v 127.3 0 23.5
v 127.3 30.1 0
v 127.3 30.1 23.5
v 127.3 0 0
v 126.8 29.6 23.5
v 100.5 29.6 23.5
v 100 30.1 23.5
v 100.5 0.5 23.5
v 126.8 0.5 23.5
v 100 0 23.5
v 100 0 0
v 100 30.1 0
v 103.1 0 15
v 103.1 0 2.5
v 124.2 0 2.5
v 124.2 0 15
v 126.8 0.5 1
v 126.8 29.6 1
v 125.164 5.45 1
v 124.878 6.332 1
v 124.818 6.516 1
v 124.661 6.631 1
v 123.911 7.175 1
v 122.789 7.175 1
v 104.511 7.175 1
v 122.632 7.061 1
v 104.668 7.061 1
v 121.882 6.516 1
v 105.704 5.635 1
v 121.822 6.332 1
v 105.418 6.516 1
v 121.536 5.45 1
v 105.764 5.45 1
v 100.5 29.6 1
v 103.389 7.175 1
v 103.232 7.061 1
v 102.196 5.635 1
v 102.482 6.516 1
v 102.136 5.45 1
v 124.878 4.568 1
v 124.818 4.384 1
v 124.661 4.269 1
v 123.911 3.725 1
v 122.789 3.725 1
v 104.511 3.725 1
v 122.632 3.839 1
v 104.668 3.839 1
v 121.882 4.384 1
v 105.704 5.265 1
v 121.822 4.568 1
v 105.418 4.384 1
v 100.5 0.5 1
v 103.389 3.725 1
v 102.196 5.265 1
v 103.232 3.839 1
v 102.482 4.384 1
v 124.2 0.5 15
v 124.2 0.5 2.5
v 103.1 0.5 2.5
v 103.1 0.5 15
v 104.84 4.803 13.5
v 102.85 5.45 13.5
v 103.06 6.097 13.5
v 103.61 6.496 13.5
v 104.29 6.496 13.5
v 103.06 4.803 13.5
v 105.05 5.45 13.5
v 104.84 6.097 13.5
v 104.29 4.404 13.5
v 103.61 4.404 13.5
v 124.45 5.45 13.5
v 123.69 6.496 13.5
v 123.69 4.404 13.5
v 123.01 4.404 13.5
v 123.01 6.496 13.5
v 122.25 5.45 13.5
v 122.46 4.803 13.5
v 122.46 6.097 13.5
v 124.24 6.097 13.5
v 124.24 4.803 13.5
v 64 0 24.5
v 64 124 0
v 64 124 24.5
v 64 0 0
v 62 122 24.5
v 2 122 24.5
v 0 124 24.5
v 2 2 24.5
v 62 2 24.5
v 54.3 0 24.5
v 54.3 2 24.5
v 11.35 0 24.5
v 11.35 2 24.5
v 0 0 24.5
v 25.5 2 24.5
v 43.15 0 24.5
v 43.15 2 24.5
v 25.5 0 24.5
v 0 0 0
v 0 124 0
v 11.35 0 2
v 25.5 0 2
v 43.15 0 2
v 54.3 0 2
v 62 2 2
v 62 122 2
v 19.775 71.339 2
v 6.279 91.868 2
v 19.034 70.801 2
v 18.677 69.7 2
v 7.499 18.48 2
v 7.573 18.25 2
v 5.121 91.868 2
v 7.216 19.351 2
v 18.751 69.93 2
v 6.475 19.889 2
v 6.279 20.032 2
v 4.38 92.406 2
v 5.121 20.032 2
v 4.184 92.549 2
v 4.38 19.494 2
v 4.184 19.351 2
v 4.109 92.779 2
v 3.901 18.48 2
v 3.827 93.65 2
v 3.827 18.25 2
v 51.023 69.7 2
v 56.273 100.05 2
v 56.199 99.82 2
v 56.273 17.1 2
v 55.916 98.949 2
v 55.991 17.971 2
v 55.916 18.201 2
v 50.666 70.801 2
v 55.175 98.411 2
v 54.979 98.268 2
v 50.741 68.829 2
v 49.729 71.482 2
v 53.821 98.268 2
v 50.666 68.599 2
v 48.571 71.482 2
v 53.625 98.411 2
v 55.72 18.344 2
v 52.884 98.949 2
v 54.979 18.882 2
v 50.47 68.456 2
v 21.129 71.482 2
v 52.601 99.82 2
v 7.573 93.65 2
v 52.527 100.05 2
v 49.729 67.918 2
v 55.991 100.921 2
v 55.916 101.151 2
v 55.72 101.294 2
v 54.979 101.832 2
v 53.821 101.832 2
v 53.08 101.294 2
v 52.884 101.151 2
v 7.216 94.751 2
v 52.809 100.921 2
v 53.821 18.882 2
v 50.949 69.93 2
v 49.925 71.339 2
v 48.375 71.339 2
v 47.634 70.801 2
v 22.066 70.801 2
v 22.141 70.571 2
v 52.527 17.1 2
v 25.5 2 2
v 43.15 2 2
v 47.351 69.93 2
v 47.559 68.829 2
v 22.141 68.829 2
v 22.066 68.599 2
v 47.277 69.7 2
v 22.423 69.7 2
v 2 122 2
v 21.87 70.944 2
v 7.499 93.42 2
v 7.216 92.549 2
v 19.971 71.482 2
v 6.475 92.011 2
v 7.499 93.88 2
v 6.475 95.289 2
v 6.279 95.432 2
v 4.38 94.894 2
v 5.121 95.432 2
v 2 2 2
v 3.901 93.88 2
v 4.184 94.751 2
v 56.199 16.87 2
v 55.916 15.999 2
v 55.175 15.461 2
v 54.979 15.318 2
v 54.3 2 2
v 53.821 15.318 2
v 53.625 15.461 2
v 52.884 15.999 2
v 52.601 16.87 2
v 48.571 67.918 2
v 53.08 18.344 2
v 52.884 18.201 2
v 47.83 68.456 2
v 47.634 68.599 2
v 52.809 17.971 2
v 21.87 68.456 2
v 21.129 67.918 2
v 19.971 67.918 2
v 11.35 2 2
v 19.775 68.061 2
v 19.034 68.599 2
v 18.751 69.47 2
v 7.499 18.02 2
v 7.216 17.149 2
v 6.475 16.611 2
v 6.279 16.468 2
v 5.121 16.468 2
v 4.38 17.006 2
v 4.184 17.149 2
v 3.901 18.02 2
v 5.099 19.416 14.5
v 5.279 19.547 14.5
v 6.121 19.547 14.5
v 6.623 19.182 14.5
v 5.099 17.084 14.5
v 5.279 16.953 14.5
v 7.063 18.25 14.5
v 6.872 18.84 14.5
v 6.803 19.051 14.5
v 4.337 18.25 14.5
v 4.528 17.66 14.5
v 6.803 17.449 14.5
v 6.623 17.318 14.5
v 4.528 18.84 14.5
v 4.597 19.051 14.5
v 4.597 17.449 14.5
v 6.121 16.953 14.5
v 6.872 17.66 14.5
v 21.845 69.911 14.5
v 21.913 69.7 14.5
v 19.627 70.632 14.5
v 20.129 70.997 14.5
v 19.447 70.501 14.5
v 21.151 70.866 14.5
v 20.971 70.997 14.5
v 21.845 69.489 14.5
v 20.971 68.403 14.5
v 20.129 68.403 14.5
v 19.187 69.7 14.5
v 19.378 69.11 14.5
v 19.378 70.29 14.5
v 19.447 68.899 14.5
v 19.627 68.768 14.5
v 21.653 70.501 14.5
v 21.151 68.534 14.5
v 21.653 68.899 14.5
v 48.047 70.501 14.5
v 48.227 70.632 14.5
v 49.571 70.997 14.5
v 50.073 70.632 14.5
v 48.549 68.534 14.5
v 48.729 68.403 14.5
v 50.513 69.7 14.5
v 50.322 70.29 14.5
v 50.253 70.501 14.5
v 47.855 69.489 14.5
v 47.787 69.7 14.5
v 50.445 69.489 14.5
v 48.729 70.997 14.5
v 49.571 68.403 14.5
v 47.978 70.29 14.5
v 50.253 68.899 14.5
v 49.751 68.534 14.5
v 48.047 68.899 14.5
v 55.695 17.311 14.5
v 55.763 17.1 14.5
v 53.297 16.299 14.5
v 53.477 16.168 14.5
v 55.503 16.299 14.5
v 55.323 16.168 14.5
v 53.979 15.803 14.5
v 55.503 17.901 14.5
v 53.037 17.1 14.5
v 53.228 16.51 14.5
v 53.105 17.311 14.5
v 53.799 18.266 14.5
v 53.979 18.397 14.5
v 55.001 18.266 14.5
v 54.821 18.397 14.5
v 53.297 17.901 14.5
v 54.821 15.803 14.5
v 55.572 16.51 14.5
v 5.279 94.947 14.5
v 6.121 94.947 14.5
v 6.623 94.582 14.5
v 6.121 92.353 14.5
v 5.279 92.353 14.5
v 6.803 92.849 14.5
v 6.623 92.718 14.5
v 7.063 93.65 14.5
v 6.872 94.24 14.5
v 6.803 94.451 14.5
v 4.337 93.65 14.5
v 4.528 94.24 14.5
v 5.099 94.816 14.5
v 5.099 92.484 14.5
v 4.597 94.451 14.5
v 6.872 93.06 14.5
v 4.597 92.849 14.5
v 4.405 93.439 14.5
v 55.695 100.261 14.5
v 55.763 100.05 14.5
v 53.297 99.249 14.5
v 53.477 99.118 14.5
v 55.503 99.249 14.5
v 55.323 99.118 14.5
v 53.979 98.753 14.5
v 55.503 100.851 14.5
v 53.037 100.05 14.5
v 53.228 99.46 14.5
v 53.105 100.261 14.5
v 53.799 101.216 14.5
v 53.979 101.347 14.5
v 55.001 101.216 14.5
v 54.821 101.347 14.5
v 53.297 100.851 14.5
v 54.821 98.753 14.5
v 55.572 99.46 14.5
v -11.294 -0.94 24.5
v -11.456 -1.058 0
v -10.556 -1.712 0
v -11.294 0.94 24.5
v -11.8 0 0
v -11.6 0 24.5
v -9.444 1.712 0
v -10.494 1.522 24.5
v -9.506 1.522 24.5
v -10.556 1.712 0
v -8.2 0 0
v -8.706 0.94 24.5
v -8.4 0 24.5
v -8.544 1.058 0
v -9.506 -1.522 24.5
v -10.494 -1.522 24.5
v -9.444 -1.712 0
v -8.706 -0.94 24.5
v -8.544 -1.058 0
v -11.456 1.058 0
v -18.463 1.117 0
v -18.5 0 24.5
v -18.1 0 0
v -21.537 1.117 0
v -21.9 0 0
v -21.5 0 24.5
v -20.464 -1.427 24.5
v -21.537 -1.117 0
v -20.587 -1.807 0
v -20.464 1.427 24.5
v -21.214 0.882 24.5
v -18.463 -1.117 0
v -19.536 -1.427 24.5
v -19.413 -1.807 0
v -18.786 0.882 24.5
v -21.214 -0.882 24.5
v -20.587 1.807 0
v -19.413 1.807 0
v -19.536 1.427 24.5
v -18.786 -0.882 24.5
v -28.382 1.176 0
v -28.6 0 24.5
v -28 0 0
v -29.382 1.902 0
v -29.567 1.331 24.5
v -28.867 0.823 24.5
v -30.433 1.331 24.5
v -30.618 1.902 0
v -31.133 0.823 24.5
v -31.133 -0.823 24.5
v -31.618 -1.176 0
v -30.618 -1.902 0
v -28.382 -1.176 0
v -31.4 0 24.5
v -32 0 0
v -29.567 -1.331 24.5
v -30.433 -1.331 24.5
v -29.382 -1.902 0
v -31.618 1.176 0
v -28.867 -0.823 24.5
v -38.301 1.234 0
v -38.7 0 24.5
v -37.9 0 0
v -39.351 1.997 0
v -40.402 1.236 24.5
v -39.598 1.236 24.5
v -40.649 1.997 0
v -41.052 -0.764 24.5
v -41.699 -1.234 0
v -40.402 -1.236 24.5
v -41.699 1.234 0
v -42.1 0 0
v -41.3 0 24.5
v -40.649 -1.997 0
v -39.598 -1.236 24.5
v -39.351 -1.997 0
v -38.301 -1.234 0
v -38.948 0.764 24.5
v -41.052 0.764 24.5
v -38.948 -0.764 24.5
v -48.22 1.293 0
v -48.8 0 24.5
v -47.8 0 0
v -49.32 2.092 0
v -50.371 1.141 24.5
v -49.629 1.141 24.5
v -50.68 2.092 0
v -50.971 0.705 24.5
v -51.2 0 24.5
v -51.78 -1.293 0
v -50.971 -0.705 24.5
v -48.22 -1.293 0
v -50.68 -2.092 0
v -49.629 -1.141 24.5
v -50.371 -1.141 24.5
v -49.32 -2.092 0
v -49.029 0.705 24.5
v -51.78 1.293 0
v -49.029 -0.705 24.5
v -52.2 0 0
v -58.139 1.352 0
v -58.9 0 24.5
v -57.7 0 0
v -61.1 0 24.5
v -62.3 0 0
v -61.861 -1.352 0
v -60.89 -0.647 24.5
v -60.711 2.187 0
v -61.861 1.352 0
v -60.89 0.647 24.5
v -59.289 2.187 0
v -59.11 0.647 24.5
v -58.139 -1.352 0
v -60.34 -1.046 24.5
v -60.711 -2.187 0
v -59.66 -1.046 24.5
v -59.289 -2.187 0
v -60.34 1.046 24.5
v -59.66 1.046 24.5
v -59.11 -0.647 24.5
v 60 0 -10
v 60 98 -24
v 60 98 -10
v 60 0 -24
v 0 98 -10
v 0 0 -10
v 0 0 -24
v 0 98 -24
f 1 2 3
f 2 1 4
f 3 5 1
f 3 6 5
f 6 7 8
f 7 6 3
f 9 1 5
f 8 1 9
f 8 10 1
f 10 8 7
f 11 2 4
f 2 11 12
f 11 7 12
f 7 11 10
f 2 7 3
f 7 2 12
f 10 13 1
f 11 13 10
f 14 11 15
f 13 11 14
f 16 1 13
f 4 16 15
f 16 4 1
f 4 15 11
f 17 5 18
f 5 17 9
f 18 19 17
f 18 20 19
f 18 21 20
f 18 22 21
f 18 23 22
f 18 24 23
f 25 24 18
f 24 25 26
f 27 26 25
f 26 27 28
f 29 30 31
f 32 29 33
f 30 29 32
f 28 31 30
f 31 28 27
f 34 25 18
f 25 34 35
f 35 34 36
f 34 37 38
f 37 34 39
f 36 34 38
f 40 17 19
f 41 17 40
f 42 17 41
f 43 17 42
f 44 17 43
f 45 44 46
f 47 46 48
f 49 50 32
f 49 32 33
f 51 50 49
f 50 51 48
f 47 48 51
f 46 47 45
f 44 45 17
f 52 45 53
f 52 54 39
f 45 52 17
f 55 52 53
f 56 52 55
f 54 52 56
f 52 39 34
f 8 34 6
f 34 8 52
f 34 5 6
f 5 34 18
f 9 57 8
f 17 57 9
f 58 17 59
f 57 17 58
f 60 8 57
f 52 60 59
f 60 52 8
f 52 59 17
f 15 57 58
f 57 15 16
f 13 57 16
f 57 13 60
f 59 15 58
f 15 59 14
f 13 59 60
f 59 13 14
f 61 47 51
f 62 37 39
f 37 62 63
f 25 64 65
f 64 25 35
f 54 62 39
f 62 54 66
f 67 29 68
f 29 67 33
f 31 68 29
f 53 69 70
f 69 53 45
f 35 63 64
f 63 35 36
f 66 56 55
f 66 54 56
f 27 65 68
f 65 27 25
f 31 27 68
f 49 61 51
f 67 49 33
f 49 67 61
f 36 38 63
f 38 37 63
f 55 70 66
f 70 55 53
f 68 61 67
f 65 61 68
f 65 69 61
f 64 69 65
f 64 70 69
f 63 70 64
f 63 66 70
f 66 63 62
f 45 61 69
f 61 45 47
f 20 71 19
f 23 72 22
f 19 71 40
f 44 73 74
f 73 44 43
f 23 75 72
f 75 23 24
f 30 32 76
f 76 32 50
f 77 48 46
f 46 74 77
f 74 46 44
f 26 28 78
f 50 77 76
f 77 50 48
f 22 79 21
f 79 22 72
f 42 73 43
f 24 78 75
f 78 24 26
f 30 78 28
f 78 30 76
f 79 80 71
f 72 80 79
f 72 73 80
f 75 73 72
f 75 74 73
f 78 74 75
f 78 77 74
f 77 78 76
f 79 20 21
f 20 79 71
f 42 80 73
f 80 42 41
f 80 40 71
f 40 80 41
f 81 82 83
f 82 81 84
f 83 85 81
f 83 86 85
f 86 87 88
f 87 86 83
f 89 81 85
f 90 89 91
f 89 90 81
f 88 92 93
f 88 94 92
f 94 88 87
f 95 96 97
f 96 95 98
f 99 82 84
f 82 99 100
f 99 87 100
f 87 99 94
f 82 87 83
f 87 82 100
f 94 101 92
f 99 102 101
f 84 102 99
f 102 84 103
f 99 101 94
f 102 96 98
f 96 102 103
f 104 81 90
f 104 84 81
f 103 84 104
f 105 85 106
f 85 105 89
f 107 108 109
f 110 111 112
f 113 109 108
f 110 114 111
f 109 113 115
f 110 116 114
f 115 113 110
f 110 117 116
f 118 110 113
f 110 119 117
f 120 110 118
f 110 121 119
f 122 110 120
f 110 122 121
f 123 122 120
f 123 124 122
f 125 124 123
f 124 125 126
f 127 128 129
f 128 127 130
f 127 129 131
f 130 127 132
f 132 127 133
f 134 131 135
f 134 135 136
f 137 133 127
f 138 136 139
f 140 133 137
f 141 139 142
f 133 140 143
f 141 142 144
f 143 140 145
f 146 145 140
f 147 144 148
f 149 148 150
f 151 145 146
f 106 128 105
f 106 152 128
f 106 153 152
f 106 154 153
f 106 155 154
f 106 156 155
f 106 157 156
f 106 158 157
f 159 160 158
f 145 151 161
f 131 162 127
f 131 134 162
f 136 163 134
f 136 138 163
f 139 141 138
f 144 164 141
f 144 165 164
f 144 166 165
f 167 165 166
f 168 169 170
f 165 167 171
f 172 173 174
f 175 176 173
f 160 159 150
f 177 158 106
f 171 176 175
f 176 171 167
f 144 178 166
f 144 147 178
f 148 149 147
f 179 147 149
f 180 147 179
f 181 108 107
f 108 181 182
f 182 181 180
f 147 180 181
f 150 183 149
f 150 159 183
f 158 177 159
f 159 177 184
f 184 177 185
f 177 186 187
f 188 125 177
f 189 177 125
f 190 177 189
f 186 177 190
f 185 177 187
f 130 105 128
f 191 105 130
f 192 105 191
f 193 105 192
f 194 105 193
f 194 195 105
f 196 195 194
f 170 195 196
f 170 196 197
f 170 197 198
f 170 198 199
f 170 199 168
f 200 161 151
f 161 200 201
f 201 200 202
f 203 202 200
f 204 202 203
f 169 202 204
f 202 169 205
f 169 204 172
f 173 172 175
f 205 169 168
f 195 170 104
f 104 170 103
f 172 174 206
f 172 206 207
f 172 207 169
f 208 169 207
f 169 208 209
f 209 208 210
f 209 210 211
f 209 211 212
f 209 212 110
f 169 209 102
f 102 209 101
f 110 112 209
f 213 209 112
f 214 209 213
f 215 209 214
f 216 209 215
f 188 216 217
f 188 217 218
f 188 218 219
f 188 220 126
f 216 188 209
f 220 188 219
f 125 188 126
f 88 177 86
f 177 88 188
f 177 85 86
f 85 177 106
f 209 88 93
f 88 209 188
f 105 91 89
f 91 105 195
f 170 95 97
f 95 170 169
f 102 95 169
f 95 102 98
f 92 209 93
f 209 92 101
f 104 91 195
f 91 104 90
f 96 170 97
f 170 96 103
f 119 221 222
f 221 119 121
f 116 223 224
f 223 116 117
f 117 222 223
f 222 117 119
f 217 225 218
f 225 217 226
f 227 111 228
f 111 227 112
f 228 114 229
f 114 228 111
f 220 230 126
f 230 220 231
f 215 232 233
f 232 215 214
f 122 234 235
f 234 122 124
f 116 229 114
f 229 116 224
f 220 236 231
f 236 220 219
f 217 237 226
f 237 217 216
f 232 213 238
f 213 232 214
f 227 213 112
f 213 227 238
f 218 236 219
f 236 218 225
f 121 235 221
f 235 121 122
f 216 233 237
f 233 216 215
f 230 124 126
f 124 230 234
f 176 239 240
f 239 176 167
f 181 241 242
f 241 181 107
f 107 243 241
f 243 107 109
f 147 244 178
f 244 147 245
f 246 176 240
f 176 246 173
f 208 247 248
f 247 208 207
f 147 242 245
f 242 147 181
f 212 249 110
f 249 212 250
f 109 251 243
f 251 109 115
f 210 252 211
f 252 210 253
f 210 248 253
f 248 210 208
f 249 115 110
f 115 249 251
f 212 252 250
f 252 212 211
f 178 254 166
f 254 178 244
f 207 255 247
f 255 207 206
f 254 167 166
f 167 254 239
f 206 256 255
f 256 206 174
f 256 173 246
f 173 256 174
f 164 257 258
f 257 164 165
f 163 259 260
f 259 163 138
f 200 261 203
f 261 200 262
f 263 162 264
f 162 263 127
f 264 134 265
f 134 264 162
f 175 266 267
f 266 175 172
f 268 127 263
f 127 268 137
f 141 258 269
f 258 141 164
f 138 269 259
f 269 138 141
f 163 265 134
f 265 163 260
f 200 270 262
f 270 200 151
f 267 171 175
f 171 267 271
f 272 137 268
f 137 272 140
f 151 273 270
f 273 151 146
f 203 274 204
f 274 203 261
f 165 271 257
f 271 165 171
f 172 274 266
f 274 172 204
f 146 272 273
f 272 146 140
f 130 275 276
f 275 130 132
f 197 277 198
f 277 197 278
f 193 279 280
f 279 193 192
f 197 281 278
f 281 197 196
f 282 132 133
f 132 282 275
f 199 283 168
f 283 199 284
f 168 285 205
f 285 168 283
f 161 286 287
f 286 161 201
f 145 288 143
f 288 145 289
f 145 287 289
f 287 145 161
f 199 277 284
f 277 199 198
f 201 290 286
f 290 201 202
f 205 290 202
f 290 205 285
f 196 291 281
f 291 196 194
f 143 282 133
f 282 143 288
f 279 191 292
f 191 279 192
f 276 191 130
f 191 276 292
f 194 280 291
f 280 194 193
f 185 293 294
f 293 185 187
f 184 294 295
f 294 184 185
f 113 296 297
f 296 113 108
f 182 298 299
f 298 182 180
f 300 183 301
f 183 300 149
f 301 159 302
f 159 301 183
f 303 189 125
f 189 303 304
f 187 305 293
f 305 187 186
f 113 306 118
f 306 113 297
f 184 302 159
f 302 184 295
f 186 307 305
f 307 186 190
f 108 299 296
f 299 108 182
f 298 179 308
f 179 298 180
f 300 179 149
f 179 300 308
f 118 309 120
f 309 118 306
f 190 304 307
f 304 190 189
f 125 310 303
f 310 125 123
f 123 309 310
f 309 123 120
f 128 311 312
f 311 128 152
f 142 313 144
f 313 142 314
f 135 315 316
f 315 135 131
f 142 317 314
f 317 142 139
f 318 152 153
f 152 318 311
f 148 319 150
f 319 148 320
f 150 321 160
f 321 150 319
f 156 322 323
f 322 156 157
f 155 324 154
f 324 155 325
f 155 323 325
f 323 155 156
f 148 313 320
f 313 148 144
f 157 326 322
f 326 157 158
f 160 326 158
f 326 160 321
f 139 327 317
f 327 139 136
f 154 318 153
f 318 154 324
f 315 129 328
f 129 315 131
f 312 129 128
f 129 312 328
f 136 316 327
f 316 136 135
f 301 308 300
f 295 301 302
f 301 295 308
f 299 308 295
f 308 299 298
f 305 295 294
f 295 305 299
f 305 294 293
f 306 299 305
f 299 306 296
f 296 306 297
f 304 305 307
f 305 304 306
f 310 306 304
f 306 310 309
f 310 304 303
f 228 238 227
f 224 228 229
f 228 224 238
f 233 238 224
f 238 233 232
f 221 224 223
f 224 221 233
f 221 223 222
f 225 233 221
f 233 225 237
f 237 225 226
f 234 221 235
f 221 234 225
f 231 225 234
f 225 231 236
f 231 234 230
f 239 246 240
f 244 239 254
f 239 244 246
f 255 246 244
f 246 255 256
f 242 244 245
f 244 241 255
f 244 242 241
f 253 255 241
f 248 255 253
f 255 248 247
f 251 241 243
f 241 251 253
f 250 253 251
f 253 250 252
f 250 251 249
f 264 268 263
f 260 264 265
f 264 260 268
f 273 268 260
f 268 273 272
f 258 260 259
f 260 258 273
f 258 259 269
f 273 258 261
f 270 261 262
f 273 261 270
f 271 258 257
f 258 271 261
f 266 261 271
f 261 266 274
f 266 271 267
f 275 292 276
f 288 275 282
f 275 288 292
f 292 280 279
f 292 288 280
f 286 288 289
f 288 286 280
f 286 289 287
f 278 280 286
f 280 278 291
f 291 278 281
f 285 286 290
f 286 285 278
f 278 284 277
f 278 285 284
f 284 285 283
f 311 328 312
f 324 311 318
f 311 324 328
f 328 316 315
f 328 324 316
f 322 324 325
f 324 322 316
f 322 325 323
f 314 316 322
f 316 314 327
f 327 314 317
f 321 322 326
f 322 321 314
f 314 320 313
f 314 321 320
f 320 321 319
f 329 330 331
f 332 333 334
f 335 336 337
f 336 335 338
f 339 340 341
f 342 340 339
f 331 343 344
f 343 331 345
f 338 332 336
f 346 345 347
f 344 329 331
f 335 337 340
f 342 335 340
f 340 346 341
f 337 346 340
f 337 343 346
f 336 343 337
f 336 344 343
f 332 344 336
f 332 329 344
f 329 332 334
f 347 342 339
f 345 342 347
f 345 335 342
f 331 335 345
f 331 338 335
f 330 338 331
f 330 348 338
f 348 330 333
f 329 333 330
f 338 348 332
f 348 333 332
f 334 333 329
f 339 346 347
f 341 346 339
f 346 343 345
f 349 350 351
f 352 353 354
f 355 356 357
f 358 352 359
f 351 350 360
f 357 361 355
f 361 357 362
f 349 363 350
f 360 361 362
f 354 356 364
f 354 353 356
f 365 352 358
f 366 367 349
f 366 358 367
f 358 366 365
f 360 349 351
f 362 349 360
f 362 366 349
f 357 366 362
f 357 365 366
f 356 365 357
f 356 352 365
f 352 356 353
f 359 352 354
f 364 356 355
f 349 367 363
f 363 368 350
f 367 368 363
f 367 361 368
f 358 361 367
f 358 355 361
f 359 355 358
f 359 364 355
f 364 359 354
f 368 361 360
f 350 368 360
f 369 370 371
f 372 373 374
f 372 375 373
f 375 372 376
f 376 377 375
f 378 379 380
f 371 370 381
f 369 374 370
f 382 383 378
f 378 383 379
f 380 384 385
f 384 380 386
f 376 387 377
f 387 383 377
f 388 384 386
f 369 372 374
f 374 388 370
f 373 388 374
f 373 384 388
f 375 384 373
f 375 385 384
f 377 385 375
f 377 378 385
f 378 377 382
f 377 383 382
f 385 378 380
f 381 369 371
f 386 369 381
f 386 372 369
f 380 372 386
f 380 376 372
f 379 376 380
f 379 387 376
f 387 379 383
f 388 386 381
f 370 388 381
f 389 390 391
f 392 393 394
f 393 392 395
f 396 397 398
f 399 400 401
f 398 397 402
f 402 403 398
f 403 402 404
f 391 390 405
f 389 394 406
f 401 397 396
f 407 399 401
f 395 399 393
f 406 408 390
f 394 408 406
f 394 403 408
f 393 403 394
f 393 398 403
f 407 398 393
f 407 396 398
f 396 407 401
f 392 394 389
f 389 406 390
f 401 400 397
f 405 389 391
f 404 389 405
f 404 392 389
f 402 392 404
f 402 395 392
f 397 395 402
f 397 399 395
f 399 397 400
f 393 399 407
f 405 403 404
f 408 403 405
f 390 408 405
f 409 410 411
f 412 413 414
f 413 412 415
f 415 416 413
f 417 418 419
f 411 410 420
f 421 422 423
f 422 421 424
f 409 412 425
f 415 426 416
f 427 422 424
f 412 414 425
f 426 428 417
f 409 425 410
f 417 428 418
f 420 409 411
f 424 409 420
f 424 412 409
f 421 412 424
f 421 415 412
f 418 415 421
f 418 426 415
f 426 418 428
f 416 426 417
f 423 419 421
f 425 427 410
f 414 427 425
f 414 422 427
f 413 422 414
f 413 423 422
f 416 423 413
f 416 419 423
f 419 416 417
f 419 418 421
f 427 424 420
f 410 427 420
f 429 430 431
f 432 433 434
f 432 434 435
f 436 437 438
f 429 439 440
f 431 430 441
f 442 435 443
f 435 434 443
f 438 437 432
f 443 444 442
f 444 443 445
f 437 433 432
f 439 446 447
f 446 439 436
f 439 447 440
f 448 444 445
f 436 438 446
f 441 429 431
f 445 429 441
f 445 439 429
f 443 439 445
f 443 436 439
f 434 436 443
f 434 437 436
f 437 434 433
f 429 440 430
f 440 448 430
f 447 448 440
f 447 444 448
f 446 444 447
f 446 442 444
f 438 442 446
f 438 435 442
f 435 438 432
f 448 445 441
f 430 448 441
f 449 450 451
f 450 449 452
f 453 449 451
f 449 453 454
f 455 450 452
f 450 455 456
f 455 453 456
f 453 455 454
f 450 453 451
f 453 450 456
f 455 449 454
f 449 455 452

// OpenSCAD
res=10;
dd=((41.5-28.5)/2)-1.7;
ddd=28.5+3.4;

// CAIXA DE ACONDICIONAMENTO DO MAX31865
MAXx=25.3+1;
MAXy=28.1+1;
MAXz=22.5;
translate([100,0,0]){
    difference(){
    cube([MAXx+1,MAXy+1,MAXz+1]);
    #translate([0.5,0.5,1])cube([MAXx,MAXy,MAXz]);
    #translate([(MAXx+1 - 18.10-3)/2,0,2.5])cube([18.10+3,2,12.5]);
    }
    difference(){
        translate([0,0,0]){
                translate([1.5+0.85+1.6,2+1+0.85+1.6,-4])cylinder(15.5+2,1.6+0.5,1.6-0.5,$fn=res);
                translate([MAXx+2.5-2-1-0.85-1.6,2+1+0.85+1.6,-4])cylinder(15.5+2,1.6+0.5,1.6-0.5,$fn=res);
        }
        #translate([0,0,-4])cube([aMEGAx+4,aMEGAy+4,4]);
}
}

// CAIXA DE ACONDICIONAMENTO DO ARDUINO UNO

//aUNOx=53.75+2;
//aUNOy=68.7+2;
//aUNOz=22.5;

aMEGAx=60;
aMEGAy=120;
aMEGAz=22.5;
translate([0,0,0]){
    difference(){
        cube([aMEGAx+4,aMEGAy+4,aMEGAz+2]);
        #translate([2,2,2])cube([aMEGAx,aMEGAy,aMEGAz]);
        #translate([2+1+9.35-1,0,2])cube([12.15+2,2,50]);
        #translate([2+1+9.35+12.15+19.65-1,0,2])cube([9.15+2,2,50]);
    }
    difference(){
            translate([0,0,0]){
                translate([2+1+1.7+1,2+1+13.55+1.7,-6])cylinder(22.5+2,1.7+0.5,1.7-0.5,$fn=res);
                translate([2+1+1.7+15.85,68.7+2+4-2-1-1.7-0.3,-6])cylinder(22.5+2,1.7+0.5,1.7-0.5,$fn=res);
                translate([53.75+2+4-2-1-1.7-5.9,68.7+2+4-2-1-1.7-0.3,-6])cylinder(22.5+2,1.7+0.5,1.7-0.5,$fn=res);
                translate([53.75+2+4-2-1-1.7-0.65,2+1+12.4+1.7,-6])cylinder(22.5+2,1.7+0.5,1.7-0.5,$fn=res);
                translate([2+1+1.7+1,2+1+13.55+1.7+3.4+72,-6])cylinder(22.5+2,1.7+0.5,1.7-0.5,$fn=res);
                translate([53.75+2+4-2-1-1.7-0.65,2+1+12.4+1.7+3.4+79.55,-6])cylinder(22.5+2,1.7+0.5,1.7-0.5,$fn=res);
            }
            #translate([0,0,-6])cube([aMEGAx+4,aMEGAy+4,6]);
            #translate([0,0,aMEGAz+2-10])cube([aMEGAx+4,aMEGAy+4,10]);
        }
}

//TESTES DE FUNIL
derd1=0.1;
derd2=0.2;
derd3=0.3;
derd4=0.4;
derd5=0.5;
derd6=0.6;
translate([-10,0,0])cylinder(22.5+2,1.7+derd1,1.7-derd1,$fn=res);
translate([-20,0,0])cylinder(22.5+2,1.7+derd2,1.7-derd2,$fn=res);
translate([-30,0,0])cylinder(22.5+2,1.7+derd3,1.7-derd3,$fn=res);
translate([-40,0,0])cylinder(22.5+2,1.7+derd4,1.7-derd4,$fn=res);
translate([-50,0,0])cylinder(22.5+2,1.7+derd5,1.7-derd5,$fn=res);
translate([-60,0,0])cylinder(22.5+2,1.7+derd6,1.7-derd6,$fn=res);

// CAIXA DE ACONDICIONAMENTO DO LCD

translate([0,0,-10-14])cube([60,98,14]);
